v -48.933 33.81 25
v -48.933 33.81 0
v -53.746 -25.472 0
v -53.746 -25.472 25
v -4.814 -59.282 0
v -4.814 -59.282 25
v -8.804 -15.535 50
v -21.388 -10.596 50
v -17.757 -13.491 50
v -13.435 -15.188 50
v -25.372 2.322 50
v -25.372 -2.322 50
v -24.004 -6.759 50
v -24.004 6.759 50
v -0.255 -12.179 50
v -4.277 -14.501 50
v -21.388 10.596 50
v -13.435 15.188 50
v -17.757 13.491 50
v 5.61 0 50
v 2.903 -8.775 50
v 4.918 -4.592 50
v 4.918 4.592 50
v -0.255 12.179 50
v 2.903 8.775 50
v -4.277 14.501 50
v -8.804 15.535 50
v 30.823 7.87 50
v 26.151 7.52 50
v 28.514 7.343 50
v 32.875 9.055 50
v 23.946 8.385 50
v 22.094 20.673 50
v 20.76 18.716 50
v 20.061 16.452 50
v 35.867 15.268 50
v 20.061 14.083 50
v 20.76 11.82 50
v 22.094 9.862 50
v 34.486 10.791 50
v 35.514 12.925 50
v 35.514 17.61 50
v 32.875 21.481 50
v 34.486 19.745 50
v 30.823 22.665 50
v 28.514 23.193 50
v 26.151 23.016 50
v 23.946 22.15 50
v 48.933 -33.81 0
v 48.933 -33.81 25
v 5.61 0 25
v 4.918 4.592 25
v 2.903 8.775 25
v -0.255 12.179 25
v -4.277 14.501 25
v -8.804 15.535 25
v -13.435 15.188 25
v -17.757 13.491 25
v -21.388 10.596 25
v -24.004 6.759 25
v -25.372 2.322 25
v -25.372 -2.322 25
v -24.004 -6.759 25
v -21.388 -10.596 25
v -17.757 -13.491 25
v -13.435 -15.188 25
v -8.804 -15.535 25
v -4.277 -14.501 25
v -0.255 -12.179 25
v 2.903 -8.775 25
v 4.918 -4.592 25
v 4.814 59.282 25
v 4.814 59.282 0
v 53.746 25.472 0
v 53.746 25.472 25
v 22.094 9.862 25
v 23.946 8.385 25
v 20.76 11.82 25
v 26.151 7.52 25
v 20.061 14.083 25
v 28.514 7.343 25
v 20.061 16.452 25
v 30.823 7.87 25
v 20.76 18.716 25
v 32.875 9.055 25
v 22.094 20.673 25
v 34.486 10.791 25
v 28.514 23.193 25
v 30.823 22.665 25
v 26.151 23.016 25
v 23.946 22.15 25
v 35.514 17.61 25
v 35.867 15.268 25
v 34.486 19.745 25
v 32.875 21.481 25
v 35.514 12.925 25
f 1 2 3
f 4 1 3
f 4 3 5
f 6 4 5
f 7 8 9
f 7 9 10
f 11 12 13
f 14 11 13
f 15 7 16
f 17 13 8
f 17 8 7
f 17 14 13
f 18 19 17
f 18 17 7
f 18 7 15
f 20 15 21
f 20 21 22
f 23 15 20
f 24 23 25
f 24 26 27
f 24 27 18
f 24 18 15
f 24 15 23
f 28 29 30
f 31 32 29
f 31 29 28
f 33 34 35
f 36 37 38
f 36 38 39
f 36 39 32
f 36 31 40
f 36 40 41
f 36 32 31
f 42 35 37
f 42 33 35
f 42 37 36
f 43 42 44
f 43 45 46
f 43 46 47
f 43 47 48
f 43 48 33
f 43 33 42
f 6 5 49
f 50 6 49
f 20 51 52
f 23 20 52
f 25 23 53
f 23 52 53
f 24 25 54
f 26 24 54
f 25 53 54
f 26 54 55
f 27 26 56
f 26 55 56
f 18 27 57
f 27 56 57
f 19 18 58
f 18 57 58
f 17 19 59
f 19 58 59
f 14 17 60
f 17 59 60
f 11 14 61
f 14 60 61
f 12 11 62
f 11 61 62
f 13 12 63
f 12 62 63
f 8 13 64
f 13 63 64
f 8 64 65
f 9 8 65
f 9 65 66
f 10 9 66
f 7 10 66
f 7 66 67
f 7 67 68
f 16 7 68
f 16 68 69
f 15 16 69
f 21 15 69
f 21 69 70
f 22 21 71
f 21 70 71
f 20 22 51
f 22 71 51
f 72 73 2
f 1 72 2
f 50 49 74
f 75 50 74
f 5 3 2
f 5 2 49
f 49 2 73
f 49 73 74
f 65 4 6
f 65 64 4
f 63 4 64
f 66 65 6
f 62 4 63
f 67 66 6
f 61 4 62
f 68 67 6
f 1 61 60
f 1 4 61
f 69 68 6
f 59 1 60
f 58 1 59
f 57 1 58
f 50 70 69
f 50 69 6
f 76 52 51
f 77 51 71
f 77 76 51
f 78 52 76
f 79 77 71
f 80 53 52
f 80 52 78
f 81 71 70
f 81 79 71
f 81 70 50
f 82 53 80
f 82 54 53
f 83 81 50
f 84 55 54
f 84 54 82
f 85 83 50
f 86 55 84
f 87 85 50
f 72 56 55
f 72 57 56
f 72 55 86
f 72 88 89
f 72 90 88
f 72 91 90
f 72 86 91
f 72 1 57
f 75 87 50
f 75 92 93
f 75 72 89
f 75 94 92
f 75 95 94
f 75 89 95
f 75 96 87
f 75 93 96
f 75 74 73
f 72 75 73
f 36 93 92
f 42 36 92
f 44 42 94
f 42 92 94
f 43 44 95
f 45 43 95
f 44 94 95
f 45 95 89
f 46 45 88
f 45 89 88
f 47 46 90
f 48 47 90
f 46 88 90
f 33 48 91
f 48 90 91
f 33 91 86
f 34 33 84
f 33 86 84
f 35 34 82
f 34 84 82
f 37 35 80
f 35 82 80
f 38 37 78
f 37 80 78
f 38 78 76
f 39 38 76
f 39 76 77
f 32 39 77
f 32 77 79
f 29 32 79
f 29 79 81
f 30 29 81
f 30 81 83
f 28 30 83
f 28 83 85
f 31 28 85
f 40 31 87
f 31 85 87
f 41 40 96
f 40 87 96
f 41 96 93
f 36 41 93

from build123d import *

# Parameters (mm, degrees)
F1_DEPTH = 25
F2_R     = 15.578145
F3_DEPTH = 25
F4_R     = 7.947035
F5_DEPTH = 25


with BuildPart() as f1:
    # F0 (on Top) → F1 (new body)
    with BuildSketch(Plane.XY):
        Polygon((4.813501, 59.28203), (-48.932993, 33.809629), (-53.746495, -25.472401), (-4.813501, -59.28203), (48.932993, -33.809629), (53.746495, 25.472401), align=None)
    extrude(amount=F1_DEPTH)

    # F2 (on face) → F3 (join)
    with BuildSketch(Plane.XY.offset(25)):
        with Locations((-9.968227, 0)):
            Circle(F2_R)
    extrude(amount=F3_DEPTH)

    # F4 (on face) → F5 (join)
    with BuildSketch(Plane.XY.offset(25)):
        with Locations((27.919721, 15.267807)):
            Circle(F4_R)
    extrude(amount=F5_DEPTH)


solid = f1.part
